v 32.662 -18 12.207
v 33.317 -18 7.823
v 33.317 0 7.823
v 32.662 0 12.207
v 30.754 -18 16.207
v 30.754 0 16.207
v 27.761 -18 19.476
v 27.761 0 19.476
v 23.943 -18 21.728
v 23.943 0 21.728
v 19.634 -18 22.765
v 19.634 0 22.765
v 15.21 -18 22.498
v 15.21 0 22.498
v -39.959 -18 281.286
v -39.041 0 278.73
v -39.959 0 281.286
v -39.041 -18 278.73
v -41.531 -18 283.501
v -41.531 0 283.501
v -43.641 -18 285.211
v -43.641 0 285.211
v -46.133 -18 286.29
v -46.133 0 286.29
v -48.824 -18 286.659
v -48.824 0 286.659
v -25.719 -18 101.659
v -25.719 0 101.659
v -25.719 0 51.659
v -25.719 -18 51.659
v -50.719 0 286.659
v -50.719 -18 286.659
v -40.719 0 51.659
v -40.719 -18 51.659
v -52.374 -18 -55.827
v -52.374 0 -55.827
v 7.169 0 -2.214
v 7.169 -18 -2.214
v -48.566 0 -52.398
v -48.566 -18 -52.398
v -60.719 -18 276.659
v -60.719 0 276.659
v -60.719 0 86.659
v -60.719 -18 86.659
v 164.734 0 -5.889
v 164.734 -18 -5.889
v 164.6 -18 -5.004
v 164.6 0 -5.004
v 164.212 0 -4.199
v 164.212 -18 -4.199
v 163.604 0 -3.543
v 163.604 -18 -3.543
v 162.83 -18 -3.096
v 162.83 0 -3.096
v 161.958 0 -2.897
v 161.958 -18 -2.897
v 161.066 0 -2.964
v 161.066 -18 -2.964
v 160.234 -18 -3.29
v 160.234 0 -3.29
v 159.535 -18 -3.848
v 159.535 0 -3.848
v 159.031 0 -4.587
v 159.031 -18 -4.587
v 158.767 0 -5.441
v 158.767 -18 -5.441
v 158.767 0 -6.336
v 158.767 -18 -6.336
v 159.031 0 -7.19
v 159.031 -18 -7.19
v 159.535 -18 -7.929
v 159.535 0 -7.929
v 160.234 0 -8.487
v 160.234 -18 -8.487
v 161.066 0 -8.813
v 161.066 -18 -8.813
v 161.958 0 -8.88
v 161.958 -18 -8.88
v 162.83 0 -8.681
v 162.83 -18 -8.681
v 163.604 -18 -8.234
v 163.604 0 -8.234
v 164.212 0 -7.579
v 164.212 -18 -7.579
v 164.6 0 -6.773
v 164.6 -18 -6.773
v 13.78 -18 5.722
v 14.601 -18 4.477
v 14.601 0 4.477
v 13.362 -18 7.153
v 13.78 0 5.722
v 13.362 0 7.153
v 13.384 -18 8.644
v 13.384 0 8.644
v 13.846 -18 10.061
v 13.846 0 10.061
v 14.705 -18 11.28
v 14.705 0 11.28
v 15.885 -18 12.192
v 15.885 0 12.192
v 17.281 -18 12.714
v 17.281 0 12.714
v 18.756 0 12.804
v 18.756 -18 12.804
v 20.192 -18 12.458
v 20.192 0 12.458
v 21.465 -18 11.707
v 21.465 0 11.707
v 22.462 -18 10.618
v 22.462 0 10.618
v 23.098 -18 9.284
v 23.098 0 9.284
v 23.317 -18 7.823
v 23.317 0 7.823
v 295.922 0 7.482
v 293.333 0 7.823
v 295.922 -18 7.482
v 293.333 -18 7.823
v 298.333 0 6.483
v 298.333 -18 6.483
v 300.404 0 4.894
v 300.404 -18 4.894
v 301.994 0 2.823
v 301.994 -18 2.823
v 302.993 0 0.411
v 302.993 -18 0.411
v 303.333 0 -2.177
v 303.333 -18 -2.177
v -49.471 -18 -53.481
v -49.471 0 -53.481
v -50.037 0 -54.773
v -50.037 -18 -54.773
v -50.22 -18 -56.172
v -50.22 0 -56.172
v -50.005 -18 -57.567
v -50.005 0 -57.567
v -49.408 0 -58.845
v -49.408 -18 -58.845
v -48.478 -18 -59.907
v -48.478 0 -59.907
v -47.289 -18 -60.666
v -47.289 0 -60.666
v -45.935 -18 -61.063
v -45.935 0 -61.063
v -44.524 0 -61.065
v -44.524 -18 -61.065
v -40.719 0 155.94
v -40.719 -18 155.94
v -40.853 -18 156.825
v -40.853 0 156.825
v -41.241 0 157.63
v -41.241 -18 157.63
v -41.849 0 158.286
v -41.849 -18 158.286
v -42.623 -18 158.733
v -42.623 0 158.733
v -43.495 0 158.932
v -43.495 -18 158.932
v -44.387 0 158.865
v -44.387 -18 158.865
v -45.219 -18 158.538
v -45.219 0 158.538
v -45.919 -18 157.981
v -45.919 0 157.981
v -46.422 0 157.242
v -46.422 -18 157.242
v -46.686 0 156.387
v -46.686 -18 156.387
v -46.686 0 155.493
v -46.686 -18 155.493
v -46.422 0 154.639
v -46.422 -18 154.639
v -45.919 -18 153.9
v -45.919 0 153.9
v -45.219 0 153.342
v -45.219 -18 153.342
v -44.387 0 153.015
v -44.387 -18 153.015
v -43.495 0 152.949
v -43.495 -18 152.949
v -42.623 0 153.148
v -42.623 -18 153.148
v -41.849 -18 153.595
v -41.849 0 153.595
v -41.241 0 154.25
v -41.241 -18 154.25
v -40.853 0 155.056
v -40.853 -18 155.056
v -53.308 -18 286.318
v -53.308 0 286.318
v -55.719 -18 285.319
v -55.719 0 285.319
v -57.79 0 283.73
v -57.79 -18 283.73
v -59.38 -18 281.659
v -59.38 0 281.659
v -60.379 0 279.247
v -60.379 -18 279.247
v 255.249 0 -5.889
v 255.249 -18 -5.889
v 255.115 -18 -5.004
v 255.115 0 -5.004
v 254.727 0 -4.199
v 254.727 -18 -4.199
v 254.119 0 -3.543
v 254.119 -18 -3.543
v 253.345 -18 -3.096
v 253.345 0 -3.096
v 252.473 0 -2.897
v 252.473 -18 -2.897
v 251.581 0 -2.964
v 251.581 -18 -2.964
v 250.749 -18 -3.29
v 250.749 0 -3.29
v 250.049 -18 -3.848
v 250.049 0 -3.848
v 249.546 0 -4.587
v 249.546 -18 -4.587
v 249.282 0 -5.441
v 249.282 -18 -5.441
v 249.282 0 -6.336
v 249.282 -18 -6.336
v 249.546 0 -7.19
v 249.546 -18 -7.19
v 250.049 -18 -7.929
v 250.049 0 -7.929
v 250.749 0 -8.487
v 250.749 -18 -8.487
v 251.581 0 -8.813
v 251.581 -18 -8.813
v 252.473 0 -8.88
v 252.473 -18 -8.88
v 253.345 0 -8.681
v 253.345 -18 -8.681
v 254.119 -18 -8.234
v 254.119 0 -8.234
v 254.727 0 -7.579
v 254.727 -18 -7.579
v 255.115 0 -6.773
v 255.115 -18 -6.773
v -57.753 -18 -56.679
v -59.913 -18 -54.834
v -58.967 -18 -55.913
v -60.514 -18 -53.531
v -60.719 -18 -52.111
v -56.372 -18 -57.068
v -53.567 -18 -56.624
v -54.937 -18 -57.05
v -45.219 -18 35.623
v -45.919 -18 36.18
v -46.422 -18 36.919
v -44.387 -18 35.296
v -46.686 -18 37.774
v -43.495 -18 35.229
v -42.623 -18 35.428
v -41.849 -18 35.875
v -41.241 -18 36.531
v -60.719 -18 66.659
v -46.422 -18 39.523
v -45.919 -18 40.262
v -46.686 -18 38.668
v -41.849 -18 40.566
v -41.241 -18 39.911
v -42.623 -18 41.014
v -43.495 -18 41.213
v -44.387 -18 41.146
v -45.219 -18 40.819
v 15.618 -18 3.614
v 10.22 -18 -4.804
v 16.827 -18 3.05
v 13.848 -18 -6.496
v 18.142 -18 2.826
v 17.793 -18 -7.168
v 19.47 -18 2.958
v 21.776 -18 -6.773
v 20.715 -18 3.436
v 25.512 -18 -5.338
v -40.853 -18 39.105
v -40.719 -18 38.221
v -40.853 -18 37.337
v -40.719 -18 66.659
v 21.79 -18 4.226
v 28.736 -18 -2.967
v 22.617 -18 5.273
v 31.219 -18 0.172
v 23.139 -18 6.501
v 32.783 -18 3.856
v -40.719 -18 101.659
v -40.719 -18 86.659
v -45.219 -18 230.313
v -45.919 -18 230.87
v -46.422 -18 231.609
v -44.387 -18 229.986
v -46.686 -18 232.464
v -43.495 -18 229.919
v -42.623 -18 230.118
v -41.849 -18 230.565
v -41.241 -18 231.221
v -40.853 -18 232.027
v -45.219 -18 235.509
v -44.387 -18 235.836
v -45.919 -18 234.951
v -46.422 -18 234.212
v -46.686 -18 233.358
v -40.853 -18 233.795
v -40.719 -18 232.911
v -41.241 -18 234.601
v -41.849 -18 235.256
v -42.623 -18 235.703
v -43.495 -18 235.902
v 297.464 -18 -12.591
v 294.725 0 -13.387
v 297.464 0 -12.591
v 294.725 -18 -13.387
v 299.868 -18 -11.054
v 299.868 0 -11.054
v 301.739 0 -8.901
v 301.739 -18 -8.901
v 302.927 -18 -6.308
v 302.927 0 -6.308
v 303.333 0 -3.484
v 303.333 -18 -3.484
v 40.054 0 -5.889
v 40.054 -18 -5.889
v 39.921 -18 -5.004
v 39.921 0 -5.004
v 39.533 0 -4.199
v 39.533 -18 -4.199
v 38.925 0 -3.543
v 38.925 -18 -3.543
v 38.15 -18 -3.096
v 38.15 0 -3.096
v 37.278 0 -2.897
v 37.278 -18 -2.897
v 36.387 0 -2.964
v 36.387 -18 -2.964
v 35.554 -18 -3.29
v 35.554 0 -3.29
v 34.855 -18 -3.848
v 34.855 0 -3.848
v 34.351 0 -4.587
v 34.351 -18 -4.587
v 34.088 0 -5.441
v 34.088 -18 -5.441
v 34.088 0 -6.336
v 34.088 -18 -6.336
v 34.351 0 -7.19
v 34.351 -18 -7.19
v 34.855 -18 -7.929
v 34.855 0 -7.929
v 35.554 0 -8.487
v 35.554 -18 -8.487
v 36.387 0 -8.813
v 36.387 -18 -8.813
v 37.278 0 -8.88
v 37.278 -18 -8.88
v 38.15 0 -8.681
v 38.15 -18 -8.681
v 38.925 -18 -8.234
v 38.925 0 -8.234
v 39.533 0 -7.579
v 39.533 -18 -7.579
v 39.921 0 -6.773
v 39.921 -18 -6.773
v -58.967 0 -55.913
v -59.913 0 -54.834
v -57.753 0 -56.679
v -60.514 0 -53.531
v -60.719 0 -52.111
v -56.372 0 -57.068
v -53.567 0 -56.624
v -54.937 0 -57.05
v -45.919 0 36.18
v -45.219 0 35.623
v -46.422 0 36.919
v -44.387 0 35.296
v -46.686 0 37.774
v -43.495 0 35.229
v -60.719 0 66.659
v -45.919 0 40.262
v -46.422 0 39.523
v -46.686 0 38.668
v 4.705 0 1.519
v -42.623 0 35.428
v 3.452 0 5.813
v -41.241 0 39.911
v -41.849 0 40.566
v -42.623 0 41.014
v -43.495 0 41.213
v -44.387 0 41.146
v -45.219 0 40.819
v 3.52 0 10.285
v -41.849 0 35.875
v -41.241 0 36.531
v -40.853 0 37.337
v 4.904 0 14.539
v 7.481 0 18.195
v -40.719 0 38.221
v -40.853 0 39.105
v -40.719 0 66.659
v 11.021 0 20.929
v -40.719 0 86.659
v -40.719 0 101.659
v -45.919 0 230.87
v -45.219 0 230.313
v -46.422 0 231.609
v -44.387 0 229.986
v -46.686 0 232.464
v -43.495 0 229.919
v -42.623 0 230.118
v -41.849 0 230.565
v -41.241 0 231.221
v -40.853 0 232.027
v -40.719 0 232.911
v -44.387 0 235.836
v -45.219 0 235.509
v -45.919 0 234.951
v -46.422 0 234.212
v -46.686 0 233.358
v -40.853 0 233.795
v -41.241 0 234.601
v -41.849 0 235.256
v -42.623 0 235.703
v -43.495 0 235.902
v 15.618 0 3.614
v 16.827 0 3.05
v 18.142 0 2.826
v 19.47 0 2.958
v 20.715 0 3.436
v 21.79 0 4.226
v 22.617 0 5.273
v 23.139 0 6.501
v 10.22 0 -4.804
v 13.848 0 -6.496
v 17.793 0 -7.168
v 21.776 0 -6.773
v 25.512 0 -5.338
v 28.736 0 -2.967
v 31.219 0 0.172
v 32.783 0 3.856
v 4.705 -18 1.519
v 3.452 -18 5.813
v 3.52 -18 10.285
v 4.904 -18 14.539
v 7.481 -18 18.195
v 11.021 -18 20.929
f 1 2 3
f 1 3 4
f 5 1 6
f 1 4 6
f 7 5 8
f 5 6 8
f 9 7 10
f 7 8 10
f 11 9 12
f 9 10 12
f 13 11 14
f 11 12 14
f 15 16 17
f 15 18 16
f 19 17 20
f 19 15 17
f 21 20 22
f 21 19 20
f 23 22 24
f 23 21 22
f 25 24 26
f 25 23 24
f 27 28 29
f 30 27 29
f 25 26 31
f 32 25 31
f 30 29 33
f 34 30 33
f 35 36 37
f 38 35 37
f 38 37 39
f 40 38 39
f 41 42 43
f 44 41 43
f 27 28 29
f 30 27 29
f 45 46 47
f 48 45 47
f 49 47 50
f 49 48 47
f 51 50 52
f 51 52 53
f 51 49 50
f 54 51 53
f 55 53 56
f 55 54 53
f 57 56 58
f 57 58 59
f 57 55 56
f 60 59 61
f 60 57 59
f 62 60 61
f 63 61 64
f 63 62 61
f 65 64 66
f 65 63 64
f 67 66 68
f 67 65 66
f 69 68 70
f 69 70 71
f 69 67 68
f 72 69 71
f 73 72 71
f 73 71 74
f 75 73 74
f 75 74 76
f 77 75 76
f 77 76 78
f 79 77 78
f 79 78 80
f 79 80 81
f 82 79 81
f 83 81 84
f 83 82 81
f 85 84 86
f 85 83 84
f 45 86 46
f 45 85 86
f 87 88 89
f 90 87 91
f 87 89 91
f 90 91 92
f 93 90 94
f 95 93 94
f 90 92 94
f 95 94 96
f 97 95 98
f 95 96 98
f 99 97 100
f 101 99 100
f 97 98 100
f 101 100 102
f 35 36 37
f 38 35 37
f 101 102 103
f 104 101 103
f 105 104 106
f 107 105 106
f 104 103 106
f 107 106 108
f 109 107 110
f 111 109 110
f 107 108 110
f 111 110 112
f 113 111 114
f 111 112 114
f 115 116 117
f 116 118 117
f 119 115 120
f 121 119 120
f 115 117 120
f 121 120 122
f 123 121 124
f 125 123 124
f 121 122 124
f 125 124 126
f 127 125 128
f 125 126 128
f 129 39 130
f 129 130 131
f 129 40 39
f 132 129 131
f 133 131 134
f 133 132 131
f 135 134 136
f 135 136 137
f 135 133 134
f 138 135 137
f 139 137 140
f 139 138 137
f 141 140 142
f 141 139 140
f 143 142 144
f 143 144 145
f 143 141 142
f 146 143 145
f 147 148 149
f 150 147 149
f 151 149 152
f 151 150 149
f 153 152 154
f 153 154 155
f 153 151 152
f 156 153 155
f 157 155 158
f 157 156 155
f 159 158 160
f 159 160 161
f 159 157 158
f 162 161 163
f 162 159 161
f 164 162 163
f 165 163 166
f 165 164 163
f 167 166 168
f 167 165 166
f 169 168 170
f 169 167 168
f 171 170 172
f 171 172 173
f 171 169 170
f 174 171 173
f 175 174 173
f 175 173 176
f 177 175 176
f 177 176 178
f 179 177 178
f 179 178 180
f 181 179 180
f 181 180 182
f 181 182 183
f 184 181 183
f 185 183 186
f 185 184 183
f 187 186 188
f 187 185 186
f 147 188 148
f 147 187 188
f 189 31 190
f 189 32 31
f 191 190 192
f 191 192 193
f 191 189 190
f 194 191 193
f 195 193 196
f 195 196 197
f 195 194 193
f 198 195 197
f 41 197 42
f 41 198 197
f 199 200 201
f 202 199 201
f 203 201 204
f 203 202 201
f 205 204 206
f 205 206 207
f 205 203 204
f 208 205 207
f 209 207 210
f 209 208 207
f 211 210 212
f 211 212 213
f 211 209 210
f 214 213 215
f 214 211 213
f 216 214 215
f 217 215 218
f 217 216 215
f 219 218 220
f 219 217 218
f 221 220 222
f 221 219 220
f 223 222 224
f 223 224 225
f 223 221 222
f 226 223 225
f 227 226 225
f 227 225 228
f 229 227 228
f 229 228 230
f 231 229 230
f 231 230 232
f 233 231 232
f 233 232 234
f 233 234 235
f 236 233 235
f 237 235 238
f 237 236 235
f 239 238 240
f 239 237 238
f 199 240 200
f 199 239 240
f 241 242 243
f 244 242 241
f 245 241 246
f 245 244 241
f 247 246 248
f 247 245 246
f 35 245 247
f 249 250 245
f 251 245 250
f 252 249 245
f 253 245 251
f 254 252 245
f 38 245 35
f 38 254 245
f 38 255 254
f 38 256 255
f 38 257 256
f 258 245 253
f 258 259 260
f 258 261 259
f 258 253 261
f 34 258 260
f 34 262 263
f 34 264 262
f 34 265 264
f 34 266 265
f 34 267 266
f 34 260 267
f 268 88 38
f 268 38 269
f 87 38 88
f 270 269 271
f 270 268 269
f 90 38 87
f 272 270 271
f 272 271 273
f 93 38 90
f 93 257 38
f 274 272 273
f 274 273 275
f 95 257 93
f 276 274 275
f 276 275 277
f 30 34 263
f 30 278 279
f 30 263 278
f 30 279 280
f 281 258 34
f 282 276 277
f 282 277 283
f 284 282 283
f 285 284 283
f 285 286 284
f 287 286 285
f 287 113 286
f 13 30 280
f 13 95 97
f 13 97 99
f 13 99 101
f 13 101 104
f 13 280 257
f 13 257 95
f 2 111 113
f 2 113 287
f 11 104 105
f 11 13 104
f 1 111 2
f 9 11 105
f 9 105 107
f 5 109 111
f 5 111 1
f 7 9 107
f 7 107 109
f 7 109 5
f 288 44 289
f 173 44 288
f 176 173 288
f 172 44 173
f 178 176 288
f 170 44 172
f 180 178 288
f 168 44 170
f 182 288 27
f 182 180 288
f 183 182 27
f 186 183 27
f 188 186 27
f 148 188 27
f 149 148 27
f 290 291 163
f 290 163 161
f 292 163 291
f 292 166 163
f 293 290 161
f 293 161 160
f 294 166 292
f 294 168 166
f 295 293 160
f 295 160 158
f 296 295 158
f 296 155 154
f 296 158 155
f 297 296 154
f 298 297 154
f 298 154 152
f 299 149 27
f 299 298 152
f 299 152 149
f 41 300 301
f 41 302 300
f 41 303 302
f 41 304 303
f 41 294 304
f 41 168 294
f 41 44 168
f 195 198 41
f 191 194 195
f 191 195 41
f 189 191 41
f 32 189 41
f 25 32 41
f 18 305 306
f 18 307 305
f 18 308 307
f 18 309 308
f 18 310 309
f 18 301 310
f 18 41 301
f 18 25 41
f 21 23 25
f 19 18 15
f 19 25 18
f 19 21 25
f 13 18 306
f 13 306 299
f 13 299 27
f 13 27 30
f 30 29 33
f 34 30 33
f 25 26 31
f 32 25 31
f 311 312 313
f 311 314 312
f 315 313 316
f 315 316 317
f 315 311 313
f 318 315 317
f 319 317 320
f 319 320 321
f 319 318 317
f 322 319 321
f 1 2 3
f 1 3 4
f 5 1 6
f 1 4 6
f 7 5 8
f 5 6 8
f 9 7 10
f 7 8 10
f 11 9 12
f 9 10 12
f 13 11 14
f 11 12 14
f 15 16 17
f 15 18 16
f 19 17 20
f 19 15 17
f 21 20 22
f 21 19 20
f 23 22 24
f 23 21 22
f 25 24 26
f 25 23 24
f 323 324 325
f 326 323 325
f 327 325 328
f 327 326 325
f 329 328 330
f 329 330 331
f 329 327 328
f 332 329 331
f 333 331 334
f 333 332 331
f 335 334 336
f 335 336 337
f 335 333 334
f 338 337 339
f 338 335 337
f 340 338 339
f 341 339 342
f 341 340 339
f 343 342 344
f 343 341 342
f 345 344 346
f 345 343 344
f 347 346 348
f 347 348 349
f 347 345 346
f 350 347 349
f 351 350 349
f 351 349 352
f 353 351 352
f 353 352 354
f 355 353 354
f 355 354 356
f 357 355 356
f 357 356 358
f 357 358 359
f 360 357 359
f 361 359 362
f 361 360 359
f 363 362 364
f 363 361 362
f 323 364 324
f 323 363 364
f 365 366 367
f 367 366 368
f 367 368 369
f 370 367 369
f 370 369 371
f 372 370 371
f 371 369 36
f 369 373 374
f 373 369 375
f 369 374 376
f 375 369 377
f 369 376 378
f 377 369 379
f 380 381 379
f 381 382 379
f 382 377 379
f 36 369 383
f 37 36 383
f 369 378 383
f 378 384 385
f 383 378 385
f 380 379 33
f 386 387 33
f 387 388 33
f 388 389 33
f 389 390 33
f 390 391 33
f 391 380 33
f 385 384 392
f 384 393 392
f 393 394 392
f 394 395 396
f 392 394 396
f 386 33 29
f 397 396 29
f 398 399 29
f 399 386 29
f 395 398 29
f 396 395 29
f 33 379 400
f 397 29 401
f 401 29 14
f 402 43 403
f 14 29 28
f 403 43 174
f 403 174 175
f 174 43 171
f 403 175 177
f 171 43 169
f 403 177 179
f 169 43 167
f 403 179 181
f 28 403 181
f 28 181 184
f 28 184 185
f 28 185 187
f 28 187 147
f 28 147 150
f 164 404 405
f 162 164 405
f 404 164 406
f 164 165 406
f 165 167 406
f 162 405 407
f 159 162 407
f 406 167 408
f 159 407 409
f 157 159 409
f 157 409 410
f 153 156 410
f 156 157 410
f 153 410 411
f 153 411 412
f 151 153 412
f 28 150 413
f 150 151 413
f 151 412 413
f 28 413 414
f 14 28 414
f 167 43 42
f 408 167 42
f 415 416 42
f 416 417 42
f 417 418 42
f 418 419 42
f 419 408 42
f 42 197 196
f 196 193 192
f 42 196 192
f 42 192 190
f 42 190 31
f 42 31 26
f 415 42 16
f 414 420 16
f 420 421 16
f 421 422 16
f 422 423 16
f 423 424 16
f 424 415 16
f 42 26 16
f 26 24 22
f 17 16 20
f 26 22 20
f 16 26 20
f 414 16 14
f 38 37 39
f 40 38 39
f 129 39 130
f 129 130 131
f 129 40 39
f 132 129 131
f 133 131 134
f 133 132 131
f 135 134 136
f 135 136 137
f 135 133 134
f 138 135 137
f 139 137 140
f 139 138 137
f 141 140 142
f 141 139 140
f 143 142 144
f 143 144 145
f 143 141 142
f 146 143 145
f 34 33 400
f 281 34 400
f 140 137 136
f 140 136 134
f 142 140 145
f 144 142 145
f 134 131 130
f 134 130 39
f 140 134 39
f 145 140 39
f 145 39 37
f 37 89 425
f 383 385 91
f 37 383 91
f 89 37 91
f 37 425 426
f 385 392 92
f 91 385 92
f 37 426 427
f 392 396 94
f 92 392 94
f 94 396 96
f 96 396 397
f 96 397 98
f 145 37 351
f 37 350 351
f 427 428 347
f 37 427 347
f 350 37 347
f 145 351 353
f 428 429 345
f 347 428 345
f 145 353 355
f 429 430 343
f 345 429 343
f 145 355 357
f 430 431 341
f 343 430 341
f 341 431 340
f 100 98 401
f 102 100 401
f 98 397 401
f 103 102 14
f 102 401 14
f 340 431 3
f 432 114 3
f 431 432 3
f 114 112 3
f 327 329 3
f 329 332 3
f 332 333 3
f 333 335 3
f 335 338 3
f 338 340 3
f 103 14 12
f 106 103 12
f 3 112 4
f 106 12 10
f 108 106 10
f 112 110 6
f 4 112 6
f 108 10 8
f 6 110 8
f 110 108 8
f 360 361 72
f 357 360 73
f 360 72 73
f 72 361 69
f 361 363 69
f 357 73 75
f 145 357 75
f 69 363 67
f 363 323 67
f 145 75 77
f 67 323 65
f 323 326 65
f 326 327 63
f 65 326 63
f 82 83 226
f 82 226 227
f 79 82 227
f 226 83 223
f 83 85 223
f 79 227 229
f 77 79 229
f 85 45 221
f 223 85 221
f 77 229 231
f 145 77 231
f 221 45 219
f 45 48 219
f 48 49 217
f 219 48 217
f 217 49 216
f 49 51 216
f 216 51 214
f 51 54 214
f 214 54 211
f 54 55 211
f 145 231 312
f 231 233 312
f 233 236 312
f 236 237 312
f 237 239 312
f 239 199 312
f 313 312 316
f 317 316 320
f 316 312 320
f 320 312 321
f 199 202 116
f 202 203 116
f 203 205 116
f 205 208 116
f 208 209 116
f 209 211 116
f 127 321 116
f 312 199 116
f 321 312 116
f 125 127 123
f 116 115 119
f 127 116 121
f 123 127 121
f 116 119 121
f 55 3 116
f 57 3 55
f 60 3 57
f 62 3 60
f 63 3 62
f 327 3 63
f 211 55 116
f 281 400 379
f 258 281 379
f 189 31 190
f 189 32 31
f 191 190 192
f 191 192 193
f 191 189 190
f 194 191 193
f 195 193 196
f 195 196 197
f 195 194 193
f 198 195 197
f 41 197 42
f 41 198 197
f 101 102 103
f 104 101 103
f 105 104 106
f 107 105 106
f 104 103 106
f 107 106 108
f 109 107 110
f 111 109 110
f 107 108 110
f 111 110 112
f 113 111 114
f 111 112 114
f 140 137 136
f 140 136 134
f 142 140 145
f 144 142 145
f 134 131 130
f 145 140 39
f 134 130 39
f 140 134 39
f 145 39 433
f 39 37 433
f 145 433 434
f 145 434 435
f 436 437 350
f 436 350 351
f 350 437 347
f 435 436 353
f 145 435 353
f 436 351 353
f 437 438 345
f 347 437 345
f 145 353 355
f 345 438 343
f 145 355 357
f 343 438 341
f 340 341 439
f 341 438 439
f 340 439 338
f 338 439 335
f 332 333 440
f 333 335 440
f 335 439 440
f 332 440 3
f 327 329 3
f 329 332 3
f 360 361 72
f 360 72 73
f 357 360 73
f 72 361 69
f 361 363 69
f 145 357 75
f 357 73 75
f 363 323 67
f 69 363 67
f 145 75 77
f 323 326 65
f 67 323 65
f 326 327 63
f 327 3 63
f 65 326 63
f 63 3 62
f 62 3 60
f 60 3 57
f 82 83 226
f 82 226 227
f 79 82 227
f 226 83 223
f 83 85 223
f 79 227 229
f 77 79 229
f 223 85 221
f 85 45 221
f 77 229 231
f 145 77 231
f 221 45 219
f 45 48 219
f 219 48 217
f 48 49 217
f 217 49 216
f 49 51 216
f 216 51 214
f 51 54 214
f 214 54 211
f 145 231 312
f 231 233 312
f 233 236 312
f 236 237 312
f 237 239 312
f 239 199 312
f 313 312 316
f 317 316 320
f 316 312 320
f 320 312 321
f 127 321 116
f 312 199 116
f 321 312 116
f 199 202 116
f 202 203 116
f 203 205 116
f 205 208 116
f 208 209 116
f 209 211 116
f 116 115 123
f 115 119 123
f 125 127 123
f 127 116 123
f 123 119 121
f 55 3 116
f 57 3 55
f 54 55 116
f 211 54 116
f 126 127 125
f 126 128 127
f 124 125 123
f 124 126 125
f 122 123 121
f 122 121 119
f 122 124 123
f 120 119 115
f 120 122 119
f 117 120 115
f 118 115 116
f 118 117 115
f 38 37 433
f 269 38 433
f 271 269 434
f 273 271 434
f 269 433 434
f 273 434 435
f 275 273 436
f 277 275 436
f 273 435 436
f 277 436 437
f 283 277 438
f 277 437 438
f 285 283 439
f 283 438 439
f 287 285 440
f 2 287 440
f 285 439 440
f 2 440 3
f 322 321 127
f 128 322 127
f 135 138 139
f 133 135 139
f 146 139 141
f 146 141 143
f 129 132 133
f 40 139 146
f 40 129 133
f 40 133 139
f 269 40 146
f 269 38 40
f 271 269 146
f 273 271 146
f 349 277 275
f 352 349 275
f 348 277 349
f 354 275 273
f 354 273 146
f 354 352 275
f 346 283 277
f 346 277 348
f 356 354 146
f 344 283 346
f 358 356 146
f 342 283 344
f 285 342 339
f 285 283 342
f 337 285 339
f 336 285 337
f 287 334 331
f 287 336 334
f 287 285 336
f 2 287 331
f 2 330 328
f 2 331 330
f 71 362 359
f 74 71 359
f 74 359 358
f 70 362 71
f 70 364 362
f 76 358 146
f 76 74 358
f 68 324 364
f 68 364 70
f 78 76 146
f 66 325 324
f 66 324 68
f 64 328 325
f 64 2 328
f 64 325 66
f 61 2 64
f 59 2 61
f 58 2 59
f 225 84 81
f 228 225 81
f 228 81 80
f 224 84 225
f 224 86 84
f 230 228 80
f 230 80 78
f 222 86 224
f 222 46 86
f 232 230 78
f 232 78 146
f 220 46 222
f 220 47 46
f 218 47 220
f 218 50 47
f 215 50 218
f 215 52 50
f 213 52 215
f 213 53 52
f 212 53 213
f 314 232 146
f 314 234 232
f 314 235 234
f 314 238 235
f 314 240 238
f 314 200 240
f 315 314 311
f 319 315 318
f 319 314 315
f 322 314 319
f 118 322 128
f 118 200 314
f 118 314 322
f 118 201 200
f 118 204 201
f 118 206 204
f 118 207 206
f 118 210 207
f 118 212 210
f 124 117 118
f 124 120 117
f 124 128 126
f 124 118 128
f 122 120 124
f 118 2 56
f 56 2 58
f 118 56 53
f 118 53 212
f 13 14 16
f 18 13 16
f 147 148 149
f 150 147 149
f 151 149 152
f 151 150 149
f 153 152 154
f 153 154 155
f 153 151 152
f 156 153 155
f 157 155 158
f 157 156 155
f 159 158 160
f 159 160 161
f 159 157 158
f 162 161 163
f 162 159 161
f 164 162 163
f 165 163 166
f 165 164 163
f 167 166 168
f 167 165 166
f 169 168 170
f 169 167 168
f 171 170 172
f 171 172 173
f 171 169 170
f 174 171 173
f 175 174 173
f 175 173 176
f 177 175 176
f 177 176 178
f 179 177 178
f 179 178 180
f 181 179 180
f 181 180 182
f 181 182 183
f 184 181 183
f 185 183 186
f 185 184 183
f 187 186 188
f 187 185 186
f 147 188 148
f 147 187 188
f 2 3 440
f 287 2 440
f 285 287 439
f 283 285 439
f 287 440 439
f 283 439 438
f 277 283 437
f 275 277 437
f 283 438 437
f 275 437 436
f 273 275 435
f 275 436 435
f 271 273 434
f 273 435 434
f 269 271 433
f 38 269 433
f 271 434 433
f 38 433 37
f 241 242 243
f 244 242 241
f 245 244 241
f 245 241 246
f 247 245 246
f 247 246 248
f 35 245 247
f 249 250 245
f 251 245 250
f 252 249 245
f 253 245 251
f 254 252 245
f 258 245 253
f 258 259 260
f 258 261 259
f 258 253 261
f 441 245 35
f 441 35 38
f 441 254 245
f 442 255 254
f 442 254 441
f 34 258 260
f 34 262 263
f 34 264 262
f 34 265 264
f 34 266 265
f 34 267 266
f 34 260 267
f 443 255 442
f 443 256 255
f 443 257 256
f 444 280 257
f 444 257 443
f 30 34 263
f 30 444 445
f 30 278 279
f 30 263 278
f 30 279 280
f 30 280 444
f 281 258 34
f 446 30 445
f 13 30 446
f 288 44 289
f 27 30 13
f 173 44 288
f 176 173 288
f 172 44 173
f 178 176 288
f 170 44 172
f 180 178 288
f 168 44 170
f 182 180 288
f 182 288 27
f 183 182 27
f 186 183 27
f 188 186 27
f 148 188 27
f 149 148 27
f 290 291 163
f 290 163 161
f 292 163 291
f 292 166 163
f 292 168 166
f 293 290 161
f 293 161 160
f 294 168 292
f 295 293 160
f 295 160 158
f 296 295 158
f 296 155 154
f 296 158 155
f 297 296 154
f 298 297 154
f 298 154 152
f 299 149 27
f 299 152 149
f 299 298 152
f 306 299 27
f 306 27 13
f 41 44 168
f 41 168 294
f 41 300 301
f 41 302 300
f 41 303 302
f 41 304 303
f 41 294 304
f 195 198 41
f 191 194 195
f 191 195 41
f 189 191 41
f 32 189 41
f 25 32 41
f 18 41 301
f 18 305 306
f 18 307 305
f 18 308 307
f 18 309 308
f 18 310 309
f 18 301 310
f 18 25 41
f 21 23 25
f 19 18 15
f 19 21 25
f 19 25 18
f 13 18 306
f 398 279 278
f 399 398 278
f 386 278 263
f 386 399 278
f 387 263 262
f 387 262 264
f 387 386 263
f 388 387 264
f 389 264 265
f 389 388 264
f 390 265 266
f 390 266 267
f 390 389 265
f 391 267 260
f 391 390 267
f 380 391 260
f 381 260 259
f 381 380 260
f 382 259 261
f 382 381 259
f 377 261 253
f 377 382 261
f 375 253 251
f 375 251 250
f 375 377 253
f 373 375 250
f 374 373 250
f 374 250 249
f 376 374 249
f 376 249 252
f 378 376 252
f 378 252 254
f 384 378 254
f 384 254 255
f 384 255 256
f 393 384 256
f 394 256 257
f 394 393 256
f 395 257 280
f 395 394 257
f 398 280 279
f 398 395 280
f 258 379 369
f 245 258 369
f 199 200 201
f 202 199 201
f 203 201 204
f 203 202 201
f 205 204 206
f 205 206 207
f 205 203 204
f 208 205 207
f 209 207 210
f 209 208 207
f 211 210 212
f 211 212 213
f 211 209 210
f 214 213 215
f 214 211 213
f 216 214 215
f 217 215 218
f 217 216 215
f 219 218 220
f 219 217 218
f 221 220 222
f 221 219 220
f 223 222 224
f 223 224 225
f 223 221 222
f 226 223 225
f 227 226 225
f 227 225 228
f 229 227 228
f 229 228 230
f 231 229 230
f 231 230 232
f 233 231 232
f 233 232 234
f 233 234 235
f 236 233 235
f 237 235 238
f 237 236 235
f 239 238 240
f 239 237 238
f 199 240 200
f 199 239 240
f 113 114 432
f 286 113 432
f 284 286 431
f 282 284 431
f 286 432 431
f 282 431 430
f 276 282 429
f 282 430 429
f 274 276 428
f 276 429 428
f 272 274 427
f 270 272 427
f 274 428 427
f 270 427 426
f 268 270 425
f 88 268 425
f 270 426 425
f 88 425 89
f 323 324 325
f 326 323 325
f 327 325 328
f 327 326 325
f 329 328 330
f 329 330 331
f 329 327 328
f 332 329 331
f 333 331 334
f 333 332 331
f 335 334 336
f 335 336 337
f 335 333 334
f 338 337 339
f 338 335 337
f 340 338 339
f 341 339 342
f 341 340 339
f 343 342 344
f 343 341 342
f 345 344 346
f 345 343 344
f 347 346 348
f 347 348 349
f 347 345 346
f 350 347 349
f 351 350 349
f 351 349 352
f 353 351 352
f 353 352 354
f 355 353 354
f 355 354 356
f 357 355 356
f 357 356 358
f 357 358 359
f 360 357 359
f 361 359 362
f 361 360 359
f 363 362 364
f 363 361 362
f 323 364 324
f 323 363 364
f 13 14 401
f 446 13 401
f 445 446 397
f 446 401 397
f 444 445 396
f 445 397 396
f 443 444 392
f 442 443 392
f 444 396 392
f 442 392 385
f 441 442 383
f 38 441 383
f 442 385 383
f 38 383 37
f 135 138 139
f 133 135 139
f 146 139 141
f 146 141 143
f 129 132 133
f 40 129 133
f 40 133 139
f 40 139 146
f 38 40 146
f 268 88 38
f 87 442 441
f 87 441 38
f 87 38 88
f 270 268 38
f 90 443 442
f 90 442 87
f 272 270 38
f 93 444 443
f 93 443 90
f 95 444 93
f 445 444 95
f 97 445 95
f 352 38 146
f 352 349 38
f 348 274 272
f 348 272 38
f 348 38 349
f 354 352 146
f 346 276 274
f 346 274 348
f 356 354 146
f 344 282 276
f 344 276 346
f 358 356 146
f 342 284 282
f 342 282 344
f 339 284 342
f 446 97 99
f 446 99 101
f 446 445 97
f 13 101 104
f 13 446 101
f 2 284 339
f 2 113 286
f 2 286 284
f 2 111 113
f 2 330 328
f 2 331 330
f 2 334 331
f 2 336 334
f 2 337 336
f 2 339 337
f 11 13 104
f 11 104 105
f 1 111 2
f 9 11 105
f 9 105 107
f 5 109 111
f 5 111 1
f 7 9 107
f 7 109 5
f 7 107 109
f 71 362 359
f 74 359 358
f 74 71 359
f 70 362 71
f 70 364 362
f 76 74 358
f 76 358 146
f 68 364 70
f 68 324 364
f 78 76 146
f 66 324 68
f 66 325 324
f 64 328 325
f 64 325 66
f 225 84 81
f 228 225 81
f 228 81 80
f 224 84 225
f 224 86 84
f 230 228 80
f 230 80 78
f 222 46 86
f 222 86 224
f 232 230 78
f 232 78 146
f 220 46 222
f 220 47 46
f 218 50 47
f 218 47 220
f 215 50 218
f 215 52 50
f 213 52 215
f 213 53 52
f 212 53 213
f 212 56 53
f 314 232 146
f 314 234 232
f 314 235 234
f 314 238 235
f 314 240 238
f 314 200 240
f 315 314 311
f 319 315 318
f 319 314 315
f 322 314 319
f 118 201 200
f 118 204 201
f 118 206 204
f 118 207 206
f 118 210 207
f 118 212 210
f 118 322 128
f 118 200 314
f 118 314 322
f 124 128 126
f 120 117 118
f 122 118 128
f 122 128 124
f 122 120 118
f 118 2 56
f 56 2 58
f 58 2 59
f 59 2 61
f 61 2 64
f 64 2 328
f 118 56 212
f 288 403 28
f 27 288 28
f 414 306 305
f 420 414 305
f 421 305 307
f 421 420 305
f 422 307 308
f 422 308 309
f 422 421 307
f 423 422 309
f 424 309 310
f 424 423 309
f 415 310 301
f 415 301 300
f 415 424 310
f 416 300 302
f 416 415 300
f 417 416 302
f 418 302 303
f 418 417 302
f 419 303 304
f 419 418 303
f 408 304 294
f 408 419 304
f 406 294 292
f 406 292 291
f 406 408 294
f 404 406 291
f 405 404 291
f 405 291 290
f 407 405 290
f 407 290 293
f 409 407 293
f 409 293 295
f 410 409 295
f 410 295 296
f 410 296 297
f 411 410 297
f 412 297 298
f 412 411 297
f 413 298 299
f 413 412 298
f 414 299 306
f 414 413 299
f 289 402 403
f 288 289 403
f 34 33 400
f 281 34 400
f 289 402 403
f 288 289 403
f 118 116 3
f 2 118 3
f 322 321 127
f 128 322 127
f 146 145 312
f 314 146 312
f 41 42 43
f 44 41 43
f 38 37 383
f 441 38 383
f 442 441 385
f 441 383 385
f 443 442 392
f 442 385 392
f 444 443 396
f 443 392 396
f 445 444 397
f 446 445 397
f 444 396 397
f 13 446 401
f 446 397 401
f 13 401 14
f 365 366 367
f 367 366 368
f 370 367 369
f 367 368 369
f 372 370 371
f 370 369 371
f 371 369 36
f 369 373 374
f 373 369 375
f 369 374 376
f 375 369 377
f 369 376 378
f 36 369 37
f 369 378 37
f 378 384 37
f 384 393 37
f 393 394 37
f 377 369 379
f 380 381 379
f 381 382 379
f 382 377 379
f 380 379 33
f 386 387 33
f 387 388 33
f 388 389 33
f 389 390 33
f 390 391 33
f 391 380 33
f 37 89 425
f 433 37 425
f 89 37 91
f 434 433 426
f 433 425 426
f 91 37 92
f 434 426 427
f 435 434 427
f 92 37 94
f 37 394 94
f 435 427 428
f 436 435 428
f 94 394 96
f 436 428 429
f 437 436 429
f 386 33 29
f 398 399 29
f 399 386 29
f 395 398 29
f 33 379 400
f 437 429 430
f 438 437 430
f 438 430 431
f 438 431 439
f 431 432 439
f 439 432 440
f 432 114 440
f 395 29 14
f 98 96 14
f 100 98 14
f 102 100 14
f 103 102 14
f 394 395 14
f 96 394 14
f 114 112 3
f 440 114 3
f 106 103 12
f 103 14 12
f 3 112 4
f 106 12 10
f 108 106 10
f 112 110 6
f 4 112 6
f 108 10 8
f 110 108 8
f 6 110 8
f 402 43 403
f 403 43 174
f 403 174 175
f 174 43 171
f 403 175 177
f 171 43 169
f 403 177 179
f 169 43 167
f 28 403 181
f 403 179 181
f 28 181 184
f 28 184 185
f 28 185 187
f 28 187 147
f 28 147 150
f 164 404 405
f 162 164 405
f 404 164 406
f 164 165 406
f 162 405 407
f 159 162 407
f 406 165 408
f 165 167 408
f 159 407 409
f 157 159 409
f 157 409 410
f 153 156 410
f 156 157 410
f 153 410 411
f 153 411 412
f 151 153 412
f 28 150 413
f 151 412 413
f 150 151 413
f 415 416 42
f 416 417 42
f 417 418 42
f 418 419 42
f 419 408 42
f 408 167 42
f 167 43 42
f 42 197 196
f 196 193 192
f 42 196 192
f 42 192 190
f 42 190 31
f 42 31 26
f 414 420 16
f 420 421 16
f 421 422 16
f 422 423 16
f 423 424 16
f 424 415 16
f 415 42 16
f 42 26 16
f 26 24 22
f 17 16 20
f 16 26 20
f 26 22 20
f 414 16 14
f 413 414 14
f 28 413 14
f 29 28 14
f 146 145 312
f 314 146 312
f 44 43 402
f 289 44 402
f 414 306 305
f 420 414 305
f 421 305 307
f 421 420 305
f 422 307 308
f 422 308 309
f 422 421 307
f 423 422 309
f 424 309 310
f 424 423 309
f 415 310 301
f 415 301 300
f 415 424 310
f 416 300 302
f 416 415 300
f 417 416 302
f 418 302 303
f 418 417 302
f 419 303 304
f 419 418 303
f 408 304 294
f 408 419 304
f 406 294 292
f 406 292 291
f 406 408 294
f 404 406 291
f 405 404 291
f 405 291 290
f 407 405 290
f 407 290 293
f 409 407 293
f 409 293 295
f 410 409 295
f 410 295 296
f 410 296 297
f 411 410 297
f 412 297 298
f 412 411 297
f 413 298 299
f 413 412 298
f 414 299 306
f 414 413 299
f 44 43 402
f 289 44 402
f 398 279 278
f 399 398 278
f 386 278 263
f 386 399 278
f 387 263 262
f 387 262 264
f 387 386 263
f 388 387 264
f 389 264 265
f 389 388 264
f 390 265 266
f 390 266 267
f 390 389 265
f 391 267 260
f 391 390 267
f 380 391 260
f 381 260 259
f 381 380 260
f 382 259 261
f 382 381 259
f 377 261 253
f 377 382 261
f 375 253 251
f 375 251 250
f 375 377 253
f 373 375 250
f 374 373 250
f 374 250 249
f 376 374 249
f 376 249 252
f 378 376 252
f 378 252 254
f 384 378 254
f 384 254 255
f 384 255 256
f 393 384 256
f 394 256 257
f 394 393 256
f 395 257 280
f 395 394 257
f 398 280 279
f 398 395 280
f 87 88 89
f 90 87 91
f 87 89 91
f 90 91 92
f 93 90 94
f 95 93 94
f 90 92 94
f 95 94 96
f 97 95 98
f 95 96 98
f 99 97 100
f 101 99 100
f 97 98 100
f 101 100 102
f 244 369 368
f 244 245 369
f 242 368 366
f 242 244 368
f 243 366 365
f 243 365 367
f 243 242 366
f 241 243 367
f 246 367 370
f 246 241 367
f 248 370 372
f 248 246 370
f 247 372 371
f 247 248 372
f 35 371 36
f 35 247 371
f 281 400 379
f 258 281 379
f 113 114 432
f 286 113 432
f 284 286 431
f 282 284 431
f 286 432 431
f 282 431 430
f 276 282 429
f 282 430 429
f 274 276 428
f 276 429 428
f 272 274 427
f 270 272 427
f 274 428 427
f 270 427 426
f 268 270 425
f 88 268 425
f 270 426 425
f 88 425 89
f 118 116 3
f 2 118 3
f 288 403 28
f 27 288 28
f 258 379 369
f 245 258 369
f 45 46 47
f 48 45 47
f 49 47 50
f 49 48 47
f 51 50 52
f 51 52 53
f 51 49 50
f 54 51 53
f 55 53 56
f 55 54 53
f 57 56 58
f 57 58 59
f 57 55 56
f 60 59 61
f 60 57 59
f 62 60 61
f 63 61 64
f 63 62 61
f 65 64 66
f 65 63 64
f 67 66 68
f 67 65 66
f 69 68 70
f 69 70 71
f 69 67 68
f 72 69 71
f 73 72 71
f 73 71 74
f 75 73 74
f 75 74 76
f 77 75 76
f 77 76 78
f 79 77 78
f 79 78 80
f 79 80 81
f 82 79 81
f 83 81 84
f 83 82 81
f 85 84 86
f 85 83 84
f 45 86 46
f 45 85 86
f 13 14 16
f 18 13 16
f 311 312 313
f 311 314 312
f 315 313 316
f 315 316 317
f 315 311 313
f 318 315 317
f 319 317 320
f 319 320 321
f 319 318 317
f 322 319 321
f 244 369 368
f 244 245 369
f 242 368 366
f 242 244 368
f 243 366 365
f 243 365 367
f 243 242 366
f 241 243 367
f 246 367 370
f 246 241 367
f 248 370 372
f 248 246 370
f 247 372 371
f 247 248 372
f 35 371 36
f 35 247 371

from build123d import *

# Parameters (mm, degrees)
F0_R     = 3
F1_DEPTH = 18
F2_DEPTH = 18
F3_DEPTH = 18
F4_DEPTH = 18
F5_R     = 5
F5_2_R   = 5
F5_3_R   = 5
F5_4_R   = 5
F6_R     = 10
F6_2_R   = 10
F6_3_R   = 10
F6_4_R   = 10


with BuildPart() as f1:
    # F0 (on Front) → F1 (new body)
    with BuildSketch(Plane.XZ):
        with BuildLine():
            Line((-60.7194070949, 66.6586026049), (-60.7194070949, -63.3413973951))
            Line((-60.7194070949, -63.3413973951), (7.1693628817, -2.2140743457))
            ThreePointArc((7.1693628817, -2.2140743457), (4.0525372812, 12.4638287862), (15.2095640051, 22.4975816663))
            Line((15.2095640051, 22.4975816663), (-40.7194070949, 286.6586026049))
            Line((-40.7194070949, 286.6586026049), (-60.7194070949, 286.6586026049))
            Line((-60.7194070949, 286.6586026049), (-60.7194070949, 86.6586026049))
            Line((-60.7194070949, 86.6586026049), (-40.7194070949, 86.6586026049))
            Line((-40.7194070949, 86.6586026049), (-40.7194070949, 101.6586026049))
            Line((-40.7194070949, 101.6586026049), (-25.7194070949, 101.6586026049))
            Line((-25.7194070949, 101.6586026049), (-25.7194070949, 51.6586026049))
            Line((-25.7194070949, 51.6586026049), (-40.7194070949, 51.6586026049))
            Line((-40.7194070949, 51.6586026049), (-40.7194070949, 66.6586026049))
            Line((-40.7194070949, 66.6586026049), (-60.7194070949, 66.6586026049))
        make_face()
        with Locations((-43.7194070949, 38.2209867239)):
            Circle(F0_R, mode=Mode.SUBTRACT)
        with Locations((-43.7194070949, 155.9402495623)):
            Circle(F0_R, mode=Mode.SUBTRACT)
        with Locations((-43.7194070949, 232.910797)):
            Circle(F0_R, mode=Mode.SUBTRACT)
    extrude(amount=F1_DEPTH)

    # F5#2
    f5_2_edges = [f1.edges().sort_by_distance(p)[0] for p in [
        (-60.719407, -9, -63.341397),
    ]]
    fillet(f5_2_edges, radius=F5_2_R)

    # F6#4
    f6_4_edges = [f1.edges().sort_by_distance(p)[0] for p in [
        (-60.719407, -9, 286.658603),
        (-40.719407, -9, 286.658603),
    ]]
    fillet(f6_4_edges, radius=F6_4_R)


with BuildPart() as f2:
    # F0 (on Front) → F2 (new body)
    with BuildSketch(Plane.XZ):
        with BuildLine():
            Line((7.1693628817, -2.2140743457), (-60.7194070949, -63.3413973951))
            Line((-60.7194070949, -63.3413973951), (303.3333769453, -12.1771152504))
            Line((303.3333769453, -12.1771152504), (303.3333769453, 7.8228847496))
            Line((303.3333769453, 7.8228847496), (33.3165352639, 7.8228847496))
            ThreePointArc((33.3165352639, 7.8228847496), (23.6920545071, -6.1808216478), (7.1693628817, -2.2140743457))
        make_face()
        with Locations((37.0541214943, -5.8885407634)):
            Circle(F0_R, mode=Mode.SUBTRACT)
        with Locations((161.7336720228, -5.8885407634)):
            Circle(F0_R, mode=Mode.SUBTRACT)
        with Locations((252.2485852242, -5.8885407634)):
            Circle(F0_R, mode=Mode.SUBTRACT)
        with BuildLine():
            Line((14.6008111365, 4.4772317179), (7.1693628817, -2.2140743457))
            ThreePointArc((7.1693628817, -2.2140743457), (23.6920545071, -6.1808216478), (33.3165352639, 7.8228847496))
            Line((33.3165352639, 7.8228847496), (23.3165352639, 7.8228847496))
            ThreePointArc((23.3165352639, 7.8228847496), (20.1083750116, 3.1549826172), (14.6008111365, 4.4772317179))
        make_face()
        with BuildLine():
            ThreePointArc((15.2095640051, 22.4975816663), (4.0525372812, 12.4638287862), (7.1693628817, -2.2140743457))
            Line((7.1693628817, -2.2140743457), (14.6008111365, 4.4772317179))
            ThreePointArc((14.6008111365, 4.4772317179), (13.5618692697, 9.3698660952), (17.2808781776, 12.7144503885))
            Line((17.2808781776, 12.7144503885), (15.2095640051, 22.4975816663))
        make_face()
        with BuildLine():
            ThreePointArc((33.3165352639, 7.8228847496), (27.7609894863, 19.4763084715), (15.2095640051, 22.4975816663))
            Line((15.2095640051, 22.4975816663), (17.2808781776, 12.7144503885))
            ThreePointArc((17.2808781776, 12.7144503885), (21.4646866713, 11.7073593236), (23.3165352639, 7.8228847496))
            Line((23.3165352639, 7.8228847496), (33.3165352639, 7.8228847496))
        make_face()
    extrude(amount=F2_DEPTH)

    # F5
    f5_edges = [f2.edges().sort_by_distance(p)[0] for p in [
        (-60.719407, -9, -63.341397),
    ]]
    fillet(f5_edges, radius=F5_R)

    # F6#2
    f6_2_edges = [f2.edges().sort_by_distance(p)[0] for p in [
        (303.333377, -9, 7.822885),
        (303.333377, -9, -12.177115),
    ]]
    fillet(f6_2_edges, radius=F6_2_R)


with BuildPart() as f3:
    # F0 (on Front) → F3 (new body)
    with BuildSketch(Plane.XZ):
        with BuildLine():
            Line((-60.7194070949, 66.6586026049), (-60.7194070949, -63.3413973951))
            Line((-60.7194070949, -63.3413973951), (7.1693628817, -2.2140743457))
            ThreePointArc((7.1693628817, -2.2140743457), (4.0525372812, 12.4638287862), (15.2095640051, 22.4975816663))
            Line((15.2095640051, 22.4975816663), (-40.7194070949, 286.6586026049))
            Line((-40.7194070949, 286.6586026049), (-60.7194070949, 286.6586026049))
            Line((-60.7194070949, 286.6586026049), (-60.7194070949, 86.6586026049))
            Line((-60.7194070949, 86.6586026049), (-40.7194070949, 86.6586026049))
            Line((-40.7194070949, 86.6586026049), (-40.7194070949, 101.6586026049))
            Line((-40.7194070949, 101.6586026049), (-25.7194070949, 101.6586026049))
            Line((-25.7194070949, 101.6586026049), (-25.7194070949, 51.6586026049))
            Line((-25.7194070949, 51.6586026049), (-40.7194070949, 51.6586026049))
            Line((-40.7194070949, 51.6586026049), (-40.7194070949, 66.6586026049))
            Line((-40.7194070949, 66.6586026049), (-60.7194070949, 66.6586026049))
        make_face()
        with Locations((-43.7194070949, 38.2209867239)):
            Circle(F0_R, mode=Mode.SUBTRACT)
        with Locations((-43.7194070949, 155.9402495623)):
            Circle(F0_R, mode=Mode.SUBTRACT)
        with Locations((-43.7194070949, 232.910797)):
            Circle(F0_R, mode=Mode.SUBTRACT)
        with BuildLine():
            ThreePointArc((15.2095640051, 22.4975816663), (4.0525372812, 12.4638287862), (7.1693628817, -2.2140743457))
            Line((7.1693628817, -2.2140743457), (14.6008111365, 4.4772317179))
            ThreePointArc((14.6008111365, 4.4772317179), (13.5618692697, 9.3698660952), (17.2808781776, 12.7144503885))
            Line((17.2808781776, 12.7144503885), (15.2095640051, 22.4975816663))
        make_face()
        with BuildLine():
            ThreePointArc((33.3165352639, 7.8228847496), (27.7609894863, 19.4763084715), (15.2095640051, 22.4975816663))
            Line((15.2095640051, 22.4975816663), (17.2808781776, 12.7144503885))
            ThreePointArc((17.2808781776, 12.7144503885), (21.4646866713, 11.7073593236), (23.3165352639, 7.8228847496))
            Line((23.3165352639, 7.8228847496), (33.3165352639, 7.8228847496))
        make_face()
        with BuildLine():
            Line((14.6008111365, 4.4772317179), (7.1693628817, -2.2140743457))
            ThreePointArc((7.1693628817, -2.2140743457), (23.6920545071, -6.1808216478), (33.3165352639, 7.8228847496))
            Line((33.3165352639, 7.8228847496), (23.3165352639, 7.8228847496))
            ThreePointArc((23.3165352639, 7.8228847496), (20.1083750116, 3.1549826172), (14.6008111365, 4.4772317179))
        make_face()
    extrude(amount=F3_DEPTH)

    # F5#3
    f5_3_edges = [f3.edges().sort_by_distance(p)[0] for p in [
        (-60.719407, -9, -63.341397),
    ]]
    fillet(f5_3_edges, radius=F5_3_R)

    # F6#3
    f6_3_edges = [f3.edges().sort_by_distance(p)[0] for p in [
        (-60.719407, -9, 286.658603),
        (-40.719407, -9, 286.658603),
    ]]
    fillet(f6_3_edges, radius=F6_3_R)


with BuildPart() as f4:
    # F0 (on Front) → F4 (new body)
    with BuildSketch(Plane.XZ):
        with BuildLine():
            Line((7.1693628817, -2.2140743457), (-60.7194070949, -63.3413973951))
            Line((-60.7194070949, -63.3413973951), (303.3333769453, -12.1771152504))
            Line((303.3333769453, -12.1771152504), (303.3333769453, 7.8228847496))
            Line((303.3333769453, 7.8228847496), (33.3165352639, 7.8228847496))
            ThreePointArc((33.3165352639, 7.8228847496), (23.6920545071, -6.1808216478), (7.1693628817, -2.2140743457))
        make_face()
        with Locations((37.0541214943, -5.8885407634)):
            Circle(F0_R, mode=Mode.SUBTRACT)
        with Locations((161.7336720228, -5.8885407634)):
            Circle(F0_R, mode=Mode.SUBTRACT)
        with Locations((252.2485852242, -5.8885407634)):
            Circle(F0_R, mode=Mode.SUBTRACT)
    extrude(amount=F4_DEPTH)

    # F5#4
    f5_4_edges = [f4.edges().sort_by_distance(p)[0] for p in [
        (-60.719407, -9, -63.341397),
    ]]
    fillet(f5_4_edges, radius=F5_4_R)

    # F6
    f6_edges = [f4.edges().sort_by_distance(p)[0] for p in [
        (303.333377, -9, 7.822885),
        (303.333377, -9, -12.177115),
    ]]
    fillet(f6_edges, radius=F6_R)


solid = Compound([f1.part, f2.part, f3.part, f4.part])
